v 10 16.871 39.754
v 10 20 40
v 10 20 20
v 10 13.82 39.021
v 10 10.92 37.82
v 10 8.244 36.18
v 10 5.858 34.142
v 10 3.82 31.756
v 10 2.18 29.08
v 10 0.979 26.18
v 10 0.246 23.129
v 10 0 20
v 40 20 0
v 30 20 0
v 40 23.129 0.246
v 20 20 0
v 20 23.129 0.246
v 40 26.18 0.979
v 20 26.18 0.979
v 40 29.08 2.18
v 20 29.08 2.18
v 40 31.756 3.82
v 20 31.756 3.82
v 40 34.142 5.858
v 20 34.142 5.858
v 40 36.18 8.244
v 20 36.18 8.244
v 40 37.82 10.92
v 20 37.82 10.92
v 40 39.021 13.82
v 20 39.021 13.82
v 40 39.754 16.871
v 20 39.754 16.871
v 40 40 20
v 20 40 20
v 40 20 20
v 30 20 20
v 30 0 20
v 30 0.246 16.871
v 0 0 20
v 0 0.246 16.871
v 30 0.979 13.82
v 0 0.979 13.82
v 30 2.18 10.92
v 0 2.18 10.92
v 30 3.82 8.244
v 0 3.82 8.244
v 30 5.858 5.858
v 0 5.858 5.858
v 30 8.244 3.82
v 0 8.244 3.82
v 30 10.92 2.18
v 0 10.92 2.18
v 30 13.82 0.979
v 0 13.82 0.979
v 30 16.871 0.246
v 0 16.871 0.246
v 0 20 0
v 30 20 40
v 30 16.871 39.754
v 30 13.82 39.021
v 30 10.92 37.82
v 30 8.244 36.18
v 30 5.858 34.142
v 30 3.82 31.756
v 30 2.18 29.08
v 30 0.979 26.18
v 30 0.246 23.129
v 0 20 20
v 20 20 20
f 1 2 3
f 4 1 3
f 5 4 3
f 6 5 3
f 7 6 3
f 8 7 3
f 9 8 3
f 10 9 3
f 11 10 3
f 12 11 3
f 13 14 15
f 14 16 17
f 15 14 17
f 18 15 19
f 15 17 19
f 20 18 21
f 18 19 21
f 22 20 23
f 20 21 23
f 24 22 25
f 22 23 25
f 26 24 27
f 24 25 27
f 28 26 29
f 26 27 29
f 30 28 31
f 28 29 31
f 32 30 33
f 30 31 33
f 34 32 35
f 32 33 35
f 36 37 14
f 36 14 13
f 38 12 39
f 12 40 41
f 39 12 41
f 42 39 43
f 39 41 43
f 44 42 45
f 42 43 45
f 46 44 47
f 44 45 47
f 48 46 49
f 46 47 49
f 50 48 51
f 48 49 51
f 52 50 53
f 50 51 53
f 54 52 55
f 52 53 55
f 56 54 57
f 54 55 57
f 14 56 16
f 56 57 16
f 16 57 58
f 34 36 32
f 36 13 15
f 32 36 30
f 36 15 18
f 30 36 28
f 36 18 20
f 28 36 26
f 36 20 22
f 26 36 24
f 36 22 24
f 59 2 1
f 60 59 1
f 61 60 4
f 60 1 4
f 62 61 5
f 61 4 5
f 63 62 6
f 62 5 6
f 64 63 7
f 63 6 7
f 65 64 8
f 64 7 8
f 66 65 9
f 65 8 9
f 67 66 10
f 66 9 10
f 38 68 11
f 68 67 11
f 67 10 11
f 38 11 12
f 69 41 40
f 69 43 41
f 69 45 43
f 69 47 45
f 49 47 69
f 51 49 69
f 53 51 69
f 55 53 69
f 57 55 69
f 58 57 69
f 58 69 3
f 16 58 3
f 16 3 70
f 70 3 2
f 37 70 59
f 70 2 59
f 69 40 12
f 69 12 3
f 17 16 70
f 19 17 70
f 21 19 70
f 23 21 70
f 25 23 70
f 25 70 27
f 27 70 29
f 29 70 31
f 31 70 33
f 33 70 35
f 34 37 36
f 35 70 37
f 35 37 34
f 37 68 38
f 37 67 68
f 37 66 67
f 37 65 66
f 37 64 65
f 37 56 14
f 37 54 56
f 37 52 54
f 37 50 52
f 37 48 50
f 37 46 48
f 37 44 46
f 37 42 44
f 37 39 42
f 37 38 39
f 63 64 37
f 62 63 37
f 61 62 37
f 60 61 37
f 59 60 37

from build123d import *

# Parameters (mm, degrees)
SKETCH1_W           = 40
SKETCH1_H           = 40
BOSS_EXTRUDE1_DEPTH = 40
SKETCH2_W           = 20
SKETCH2_H           = 20
SKETCH2_W_2         = 10
CUT_EXTRUDE1_DEPTH  = 40
SKETCH3_W           = 20
SKETCH3_H           = 20
CUT_EXTRUDE2_DEPTH  = 40
CUT_EXTRUDE3_DEPTH  = 40
CUT_EXTRUDE4_DEPTH  = 40
CUT_EXTRUDE5_DEPTH  = 10


with BuildPart() as part:
    # Sketch1 → Boss-Extrude1 (new body)
    with BuildSketch(Plane.XY):
        with Locations((20, 20)):
            Rectangle(SKETCH1_W, SKETCH1_H)
    extrude(amount=BOSS_EXTRUDE1_DEPTH)

    # Sketch2 → Cut-Extrude1 (cut)
    with BuildSketch(Plane.XY.offset(40)):
        with Locations((10, 30)):
            Rectangle(SKETCH2_W, SKETCH2_H)
        with Locations((35, 10)):
            Rectangle(SKETCH2_W_2, SKETCH2_H)
    extrude(amount=-CUT_EXTRUDE1_DEPTH, mode=Mode.SUBTRACT)

    # Sketch3 → Cut-Extrude2 (cut)
    with BuildSketch(Plane.ZY.offset(-20)):
        with Locations((30, 30)):
            Rectangle(SKETCH3_W, SKETCH3_H)
    extrude(amount=-CUT_EXTRUDE2_DEPTH, mode=Mode.SUBTRACT)

    # Sketch4 → Cut-Extrude3 (cut)
    with BuildSketch(Plane.ZY.offset(-20)):
        with BuildLine():
            Line((20, 40), (0, 40))
            Line((0, 40), (0, 20))
            ThreePointArc((0, 20), (5.857864376, 34.142135624), (20, 40))
        make_face()
    extrude(amount=-CUT_EXTRUDE3_DEPTH, mode=Mode.SUBTRACT)

    # Sketch5 → Cut-Extrude4 (cut)
    with BuildSketch(Plane.ZY):
        with BuildLine():
            Line((0, 0), (20, 0))
            ThreePointArc((20, 0), (5.857864376, 5.857864376), (0, 20))
            Line((0, 20), (0, 0))
        make_face()
        with BuildLine():
            Line((40, 0), (40, 20))
            ThreePointArc((40, 20), (34.142135624, 5.857864376), (20, 0))
            Line((20, 0), (40, 0))
        make_face()
    extrude(amount=-CUT_EXTRUDE4_DEPTH, mode=Mode.SUBTRACT)

    # Sketch6 → Cut-Extrude5 (cut)
    with BuildSketch(Plane.ZY):
        with BuildLine():
            Line((20, 0), (20, 20))
            Line((20, 20), (40, 20))
            ThreePointArc((40, 20), (34.142135624, 5.857864376), (20, 0))
        make_face()
    extrude(amount=-CUT_EXTRUDE5_DEPTH, mode=Mode.SUBTRACT)


solid = part.part
